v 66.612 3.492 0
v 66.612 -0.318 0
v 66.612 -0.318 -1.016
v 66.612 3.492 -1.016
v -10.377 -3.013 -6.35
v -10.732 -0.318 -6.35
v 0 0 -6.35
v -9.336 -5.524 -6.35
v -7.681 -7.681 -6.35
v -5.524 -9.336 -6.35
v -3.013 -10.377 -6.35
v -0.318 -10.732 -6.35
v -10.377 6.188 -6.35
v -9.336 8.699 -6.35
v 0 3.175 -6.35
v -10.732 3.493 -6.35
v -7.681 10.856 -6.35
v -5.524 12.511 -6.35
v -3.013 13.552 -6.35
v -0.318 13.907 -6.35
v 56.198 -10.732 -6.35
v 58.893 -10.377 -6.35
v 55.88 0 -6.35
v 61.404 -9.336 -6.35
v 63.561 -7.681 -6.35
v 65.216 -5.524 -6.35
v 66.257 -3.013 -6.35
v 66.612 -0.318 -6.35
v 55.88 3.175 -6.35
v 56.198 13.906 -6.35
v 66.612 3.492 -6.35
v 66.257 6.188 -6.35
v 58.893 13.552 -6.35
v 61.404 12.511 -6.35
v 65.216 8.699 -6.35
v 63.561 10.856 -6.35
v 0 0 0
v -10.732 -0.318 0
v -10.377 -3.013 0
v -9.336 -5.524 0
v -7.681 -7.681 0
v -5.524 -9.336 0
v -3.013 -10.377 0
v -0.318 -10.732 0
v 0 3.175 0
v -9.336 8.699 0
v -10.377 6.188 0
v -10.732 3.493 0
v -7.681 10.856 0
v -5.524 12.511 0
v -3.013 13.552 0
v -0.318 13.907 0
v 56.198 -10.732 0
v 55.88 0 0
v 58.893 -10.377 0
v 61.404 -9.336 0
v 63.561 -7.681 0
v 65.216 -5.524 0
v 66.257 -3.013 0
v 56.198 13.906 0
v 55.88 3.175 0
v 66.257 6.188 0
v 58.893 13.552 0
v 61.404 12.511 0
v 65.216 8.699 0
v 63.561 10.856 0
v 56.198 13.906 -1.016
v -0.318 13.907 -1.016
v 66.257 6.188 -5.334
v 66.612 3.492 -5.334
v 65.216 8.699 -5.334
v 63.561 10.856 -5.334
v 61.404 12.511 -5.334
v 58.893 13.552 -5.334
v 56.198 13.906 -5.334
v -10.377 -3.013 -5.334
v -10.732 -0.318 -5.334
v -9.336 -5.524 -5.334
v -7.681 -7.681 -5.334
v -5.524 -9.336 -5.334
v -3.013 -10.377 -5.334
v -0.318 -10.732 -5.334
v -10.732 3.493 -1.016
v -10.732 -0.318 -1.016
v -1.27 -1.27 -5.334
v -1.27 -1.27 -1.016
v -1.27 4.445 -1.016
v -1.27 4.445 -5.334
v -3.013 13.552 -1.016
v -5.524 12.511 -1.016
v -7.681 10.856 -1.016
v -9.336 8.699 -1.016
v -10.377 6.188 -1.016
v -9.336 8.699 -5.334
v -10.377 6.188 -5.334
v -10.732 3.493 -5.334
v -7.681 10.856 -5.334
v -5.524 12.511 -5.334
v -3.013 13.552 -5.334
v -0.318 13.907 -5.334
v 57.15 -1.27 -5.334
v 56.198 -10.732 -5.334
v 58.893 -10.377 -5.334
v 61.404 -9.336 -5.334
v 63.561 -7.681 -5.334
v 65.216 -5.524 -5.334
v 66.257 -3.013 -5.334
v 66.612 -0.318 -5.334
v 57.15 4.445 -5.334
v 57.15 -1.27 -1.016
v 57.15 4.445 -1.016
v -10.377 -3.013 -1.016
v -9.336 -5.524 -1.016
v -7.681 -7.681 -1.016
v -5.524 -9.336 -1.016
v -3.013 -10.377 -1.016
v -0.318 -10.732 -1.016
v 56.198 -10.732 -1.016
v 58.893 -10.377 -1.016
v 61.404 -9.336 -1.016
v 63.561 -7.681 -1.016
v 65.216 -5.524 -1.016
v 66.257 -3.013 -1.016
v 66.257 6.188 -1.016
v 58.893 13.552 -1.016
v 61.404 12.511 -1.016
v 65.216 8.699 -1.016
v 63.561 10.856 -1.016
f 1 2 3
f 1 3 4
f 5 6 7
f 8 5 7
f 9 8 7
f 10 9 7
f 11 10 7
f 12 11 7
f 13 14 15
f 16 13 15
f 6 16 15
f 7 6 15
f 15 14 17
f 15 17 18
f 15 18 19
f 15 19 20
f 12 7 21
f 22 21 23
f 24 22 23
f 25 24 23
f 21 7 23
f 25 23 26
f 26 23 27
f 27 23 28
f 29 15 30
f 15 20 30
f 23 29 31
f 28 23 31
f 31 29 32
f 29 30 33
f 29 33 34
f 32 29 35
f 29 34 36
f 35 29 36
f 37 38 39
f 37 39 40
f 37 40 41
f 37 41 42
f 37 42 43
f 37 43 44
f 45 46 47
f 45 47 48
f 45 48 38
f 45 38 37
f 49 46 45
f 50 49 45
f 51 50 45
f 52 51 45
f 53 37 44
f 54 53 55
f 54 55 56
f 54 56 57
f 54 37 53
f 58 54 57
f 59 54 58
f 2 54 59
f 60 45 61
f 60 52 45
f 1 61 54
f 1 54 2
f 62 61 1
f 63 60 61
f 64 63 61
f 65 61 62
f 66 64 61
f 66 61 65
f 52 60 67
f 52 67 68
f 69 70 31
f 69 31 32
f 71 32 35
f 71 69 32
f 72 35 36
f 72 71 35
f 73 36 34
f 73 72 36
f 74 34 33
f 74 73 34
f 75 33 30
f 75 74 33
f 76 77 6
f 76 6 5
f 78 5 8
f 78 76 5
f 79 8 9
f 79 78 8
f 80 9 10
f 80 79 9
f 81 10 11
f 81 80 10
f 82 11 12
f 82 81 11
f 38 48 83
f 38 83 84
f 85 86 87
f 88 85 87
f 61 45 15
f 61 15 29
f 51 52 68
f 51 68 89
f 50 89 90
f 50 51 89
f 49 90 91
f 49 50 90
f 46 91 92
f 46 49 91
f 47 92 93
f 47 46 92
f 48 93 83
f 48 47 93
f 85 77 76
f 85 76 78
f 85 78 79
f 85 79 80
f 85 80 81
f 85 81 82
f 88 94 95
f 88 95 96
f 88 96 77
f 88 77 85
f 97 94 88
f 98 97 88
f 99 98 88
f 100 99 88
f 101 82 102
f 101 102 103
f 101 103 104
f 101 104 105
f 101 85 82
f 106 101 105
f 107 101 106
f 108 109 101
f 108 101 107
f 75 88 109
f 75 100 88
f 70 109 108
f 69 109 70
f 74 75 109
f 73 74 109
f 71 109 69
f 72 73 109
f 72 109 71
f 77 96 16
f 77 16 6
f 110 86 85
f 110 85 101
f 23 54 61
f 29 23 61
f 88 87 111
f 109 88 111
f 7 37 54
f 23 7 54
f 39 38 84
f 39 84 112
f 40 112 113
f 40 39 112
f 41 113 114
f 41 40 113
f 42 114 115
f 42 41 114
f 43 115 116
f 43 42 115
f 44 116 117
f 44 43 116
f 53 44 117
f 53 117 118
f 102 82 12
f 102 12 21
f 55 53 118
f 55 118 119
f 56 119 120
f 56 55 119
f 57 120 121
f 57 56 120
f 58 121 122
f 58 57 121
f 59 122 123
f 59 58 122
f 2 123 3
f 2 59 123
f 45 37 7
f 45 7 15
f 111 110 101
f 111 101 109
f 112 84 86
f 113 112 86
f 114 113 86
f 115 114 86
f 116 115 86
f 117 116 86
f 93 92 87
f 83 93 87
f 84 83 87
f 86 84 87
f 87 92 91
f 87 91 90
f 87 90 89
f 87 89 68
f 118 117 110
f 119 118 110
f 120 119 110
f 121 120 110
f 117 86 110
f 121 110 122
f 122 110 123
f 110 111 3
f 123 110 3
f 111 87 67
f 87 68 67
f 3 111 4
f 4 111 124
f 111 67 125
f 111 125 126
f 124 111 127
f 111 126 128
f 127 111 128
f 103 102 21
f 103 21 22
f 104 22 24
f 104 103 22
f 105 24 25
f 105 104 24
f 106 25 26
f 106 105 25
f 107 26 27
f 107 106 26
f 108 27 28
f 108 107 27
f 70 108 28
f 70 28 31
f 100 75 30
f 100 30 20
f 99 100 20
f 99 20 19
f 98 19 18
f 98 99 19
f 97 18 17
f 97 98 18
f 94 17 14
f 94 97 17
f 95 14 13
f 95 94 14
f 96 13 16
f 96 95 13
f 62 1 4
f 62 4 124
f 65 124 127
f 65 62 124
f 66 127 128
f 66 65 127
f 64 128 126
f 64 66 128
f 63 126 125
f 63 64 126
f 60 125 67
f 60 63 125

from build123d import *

# Parameters (mm, degrees)
F0_W     = 58.42
F0_H     = 5.715
F0_W_2   = 55.88
F0_H_2   = 3.175
F1_DEPTH = 6.35
F2_DEPTH = 5.334
F3_DEPTH = 1.016


with BuildPart() as f1:
    # F0 (on Top) → F1 (new body)
    with BuildSketch(Plane.XY):
        with BuildLine():
            Line((56.1975, 13.9065), (-0.3175, 13.9065))
            ThreePointArc((-0.3175, 13.9065), (-7.68131, 10.85631), (-10.7315, 3.4925))
            Line((-10.7315, 3.4925), (-10.7315, -0.3175))
            ThreePointArc((-10.7315, -0.3175), (-7.68131, -7.68131), (-0.3175, -10.7315))
            Line((-0.3175, -10.7315), (56.1975, -10.7315))
            ThreePointArc((56.1975, -10.7315), (63.56131, -7.68131), (66.6115, -0.3175))
            Line((66.6115, -0.3175), (66.6115, 3.4925))
            ThreePointArc((66.6115, 3.4925), (63.56131, 10.85631), (56.1975, 13.9065))
        make_face()
        with Locations((27.94, 1.5875)):
            Rectangle(F0_W, F0_H, mode=Mode.SUBTRACT)
        with Locations((27.94, 1.5875)):
            Rectangle(F0_W, F0_H)
        with Locations((27.94, 1.5875)):
            Rectangle(F0_W_2, F0_H_2, mode=Mode.SUBTRACT)
    extrude(amount=-F1_DEPTH)

    # F0 (on Top) → F2 (cut)
    with BuildSketch(Plane.XY):
        with BuildLine():
            Line((56.1975, 13.9065), (-0.3175, 13.9065))
            ThreePointArc((-0.3175, 13.9065), (-7.68131, 10.85631), (-10.7315, 3.4925))
            Line((-10.7315, 3.4925), (-10.7315, -0.3175))
            ThreePointArc((-10.7315, -0.3175), (-7.68131, -7.68131), (-0.3175, -10.7315))
            Line((-0.3175, -10.7315), (56.1975, -10.7315))
            ThreePointArc((56.1975, -10.7315), (63.56131, -7.68131), (66.6115, -0.3175))
            Line((66.6115, -0.3175), (66.6115, 3.4925))
            ThreePointArc((66.6115, 3.4925), (63.56131, 10.85631), (56.1975, 13.9065))
        make_face()
        with Locations((27.94, 1.5875)):
            Rectangle(F0_W, F0_H, mode=Mode.SUBTRACT)
    extrude(amount=-F2_DEPTH, mode=Mode.SUBTRACT)

    # F0 (on Top) → F3 (join)
    with BuildSketch(Plane.XY):
        with BuildLine():
            Line((56.1975, 13.9065), (-0.3175, 13.9065))
            ThreePointArc((-0.3175, 13.9065), (-7.68131, 10.85631), (-10.7315, 3.4925))
            Line((-10.7315, 3.4925), (-10.7315, -0.3175))
            ThreePointArc((-10.7315, -0.3175), (-7.68131, -7.68131), (-0.3175, -10.7315))
            Line((-0.3175, -10.7315), (56.1975, -10.7315))
            ThreePointArc((56.1975, -10.7315), (63.56131, -7.68131), (66.6115, -0.3175))
            Line((66.6115, -0.3175), (66.6115, 3.4925))
            ThreePointArc((66.6115, 3.4925), (63.56131, 10.85631), (56.1975, 13.9065))
        make_face()
        with Locations((27.94, 1.5875)):
            Rectangle(F0_W, F0_H, mode=Mode.SUBTRACT)
    extrude(amount=-F3_DEPTH)


solid = f1.part
